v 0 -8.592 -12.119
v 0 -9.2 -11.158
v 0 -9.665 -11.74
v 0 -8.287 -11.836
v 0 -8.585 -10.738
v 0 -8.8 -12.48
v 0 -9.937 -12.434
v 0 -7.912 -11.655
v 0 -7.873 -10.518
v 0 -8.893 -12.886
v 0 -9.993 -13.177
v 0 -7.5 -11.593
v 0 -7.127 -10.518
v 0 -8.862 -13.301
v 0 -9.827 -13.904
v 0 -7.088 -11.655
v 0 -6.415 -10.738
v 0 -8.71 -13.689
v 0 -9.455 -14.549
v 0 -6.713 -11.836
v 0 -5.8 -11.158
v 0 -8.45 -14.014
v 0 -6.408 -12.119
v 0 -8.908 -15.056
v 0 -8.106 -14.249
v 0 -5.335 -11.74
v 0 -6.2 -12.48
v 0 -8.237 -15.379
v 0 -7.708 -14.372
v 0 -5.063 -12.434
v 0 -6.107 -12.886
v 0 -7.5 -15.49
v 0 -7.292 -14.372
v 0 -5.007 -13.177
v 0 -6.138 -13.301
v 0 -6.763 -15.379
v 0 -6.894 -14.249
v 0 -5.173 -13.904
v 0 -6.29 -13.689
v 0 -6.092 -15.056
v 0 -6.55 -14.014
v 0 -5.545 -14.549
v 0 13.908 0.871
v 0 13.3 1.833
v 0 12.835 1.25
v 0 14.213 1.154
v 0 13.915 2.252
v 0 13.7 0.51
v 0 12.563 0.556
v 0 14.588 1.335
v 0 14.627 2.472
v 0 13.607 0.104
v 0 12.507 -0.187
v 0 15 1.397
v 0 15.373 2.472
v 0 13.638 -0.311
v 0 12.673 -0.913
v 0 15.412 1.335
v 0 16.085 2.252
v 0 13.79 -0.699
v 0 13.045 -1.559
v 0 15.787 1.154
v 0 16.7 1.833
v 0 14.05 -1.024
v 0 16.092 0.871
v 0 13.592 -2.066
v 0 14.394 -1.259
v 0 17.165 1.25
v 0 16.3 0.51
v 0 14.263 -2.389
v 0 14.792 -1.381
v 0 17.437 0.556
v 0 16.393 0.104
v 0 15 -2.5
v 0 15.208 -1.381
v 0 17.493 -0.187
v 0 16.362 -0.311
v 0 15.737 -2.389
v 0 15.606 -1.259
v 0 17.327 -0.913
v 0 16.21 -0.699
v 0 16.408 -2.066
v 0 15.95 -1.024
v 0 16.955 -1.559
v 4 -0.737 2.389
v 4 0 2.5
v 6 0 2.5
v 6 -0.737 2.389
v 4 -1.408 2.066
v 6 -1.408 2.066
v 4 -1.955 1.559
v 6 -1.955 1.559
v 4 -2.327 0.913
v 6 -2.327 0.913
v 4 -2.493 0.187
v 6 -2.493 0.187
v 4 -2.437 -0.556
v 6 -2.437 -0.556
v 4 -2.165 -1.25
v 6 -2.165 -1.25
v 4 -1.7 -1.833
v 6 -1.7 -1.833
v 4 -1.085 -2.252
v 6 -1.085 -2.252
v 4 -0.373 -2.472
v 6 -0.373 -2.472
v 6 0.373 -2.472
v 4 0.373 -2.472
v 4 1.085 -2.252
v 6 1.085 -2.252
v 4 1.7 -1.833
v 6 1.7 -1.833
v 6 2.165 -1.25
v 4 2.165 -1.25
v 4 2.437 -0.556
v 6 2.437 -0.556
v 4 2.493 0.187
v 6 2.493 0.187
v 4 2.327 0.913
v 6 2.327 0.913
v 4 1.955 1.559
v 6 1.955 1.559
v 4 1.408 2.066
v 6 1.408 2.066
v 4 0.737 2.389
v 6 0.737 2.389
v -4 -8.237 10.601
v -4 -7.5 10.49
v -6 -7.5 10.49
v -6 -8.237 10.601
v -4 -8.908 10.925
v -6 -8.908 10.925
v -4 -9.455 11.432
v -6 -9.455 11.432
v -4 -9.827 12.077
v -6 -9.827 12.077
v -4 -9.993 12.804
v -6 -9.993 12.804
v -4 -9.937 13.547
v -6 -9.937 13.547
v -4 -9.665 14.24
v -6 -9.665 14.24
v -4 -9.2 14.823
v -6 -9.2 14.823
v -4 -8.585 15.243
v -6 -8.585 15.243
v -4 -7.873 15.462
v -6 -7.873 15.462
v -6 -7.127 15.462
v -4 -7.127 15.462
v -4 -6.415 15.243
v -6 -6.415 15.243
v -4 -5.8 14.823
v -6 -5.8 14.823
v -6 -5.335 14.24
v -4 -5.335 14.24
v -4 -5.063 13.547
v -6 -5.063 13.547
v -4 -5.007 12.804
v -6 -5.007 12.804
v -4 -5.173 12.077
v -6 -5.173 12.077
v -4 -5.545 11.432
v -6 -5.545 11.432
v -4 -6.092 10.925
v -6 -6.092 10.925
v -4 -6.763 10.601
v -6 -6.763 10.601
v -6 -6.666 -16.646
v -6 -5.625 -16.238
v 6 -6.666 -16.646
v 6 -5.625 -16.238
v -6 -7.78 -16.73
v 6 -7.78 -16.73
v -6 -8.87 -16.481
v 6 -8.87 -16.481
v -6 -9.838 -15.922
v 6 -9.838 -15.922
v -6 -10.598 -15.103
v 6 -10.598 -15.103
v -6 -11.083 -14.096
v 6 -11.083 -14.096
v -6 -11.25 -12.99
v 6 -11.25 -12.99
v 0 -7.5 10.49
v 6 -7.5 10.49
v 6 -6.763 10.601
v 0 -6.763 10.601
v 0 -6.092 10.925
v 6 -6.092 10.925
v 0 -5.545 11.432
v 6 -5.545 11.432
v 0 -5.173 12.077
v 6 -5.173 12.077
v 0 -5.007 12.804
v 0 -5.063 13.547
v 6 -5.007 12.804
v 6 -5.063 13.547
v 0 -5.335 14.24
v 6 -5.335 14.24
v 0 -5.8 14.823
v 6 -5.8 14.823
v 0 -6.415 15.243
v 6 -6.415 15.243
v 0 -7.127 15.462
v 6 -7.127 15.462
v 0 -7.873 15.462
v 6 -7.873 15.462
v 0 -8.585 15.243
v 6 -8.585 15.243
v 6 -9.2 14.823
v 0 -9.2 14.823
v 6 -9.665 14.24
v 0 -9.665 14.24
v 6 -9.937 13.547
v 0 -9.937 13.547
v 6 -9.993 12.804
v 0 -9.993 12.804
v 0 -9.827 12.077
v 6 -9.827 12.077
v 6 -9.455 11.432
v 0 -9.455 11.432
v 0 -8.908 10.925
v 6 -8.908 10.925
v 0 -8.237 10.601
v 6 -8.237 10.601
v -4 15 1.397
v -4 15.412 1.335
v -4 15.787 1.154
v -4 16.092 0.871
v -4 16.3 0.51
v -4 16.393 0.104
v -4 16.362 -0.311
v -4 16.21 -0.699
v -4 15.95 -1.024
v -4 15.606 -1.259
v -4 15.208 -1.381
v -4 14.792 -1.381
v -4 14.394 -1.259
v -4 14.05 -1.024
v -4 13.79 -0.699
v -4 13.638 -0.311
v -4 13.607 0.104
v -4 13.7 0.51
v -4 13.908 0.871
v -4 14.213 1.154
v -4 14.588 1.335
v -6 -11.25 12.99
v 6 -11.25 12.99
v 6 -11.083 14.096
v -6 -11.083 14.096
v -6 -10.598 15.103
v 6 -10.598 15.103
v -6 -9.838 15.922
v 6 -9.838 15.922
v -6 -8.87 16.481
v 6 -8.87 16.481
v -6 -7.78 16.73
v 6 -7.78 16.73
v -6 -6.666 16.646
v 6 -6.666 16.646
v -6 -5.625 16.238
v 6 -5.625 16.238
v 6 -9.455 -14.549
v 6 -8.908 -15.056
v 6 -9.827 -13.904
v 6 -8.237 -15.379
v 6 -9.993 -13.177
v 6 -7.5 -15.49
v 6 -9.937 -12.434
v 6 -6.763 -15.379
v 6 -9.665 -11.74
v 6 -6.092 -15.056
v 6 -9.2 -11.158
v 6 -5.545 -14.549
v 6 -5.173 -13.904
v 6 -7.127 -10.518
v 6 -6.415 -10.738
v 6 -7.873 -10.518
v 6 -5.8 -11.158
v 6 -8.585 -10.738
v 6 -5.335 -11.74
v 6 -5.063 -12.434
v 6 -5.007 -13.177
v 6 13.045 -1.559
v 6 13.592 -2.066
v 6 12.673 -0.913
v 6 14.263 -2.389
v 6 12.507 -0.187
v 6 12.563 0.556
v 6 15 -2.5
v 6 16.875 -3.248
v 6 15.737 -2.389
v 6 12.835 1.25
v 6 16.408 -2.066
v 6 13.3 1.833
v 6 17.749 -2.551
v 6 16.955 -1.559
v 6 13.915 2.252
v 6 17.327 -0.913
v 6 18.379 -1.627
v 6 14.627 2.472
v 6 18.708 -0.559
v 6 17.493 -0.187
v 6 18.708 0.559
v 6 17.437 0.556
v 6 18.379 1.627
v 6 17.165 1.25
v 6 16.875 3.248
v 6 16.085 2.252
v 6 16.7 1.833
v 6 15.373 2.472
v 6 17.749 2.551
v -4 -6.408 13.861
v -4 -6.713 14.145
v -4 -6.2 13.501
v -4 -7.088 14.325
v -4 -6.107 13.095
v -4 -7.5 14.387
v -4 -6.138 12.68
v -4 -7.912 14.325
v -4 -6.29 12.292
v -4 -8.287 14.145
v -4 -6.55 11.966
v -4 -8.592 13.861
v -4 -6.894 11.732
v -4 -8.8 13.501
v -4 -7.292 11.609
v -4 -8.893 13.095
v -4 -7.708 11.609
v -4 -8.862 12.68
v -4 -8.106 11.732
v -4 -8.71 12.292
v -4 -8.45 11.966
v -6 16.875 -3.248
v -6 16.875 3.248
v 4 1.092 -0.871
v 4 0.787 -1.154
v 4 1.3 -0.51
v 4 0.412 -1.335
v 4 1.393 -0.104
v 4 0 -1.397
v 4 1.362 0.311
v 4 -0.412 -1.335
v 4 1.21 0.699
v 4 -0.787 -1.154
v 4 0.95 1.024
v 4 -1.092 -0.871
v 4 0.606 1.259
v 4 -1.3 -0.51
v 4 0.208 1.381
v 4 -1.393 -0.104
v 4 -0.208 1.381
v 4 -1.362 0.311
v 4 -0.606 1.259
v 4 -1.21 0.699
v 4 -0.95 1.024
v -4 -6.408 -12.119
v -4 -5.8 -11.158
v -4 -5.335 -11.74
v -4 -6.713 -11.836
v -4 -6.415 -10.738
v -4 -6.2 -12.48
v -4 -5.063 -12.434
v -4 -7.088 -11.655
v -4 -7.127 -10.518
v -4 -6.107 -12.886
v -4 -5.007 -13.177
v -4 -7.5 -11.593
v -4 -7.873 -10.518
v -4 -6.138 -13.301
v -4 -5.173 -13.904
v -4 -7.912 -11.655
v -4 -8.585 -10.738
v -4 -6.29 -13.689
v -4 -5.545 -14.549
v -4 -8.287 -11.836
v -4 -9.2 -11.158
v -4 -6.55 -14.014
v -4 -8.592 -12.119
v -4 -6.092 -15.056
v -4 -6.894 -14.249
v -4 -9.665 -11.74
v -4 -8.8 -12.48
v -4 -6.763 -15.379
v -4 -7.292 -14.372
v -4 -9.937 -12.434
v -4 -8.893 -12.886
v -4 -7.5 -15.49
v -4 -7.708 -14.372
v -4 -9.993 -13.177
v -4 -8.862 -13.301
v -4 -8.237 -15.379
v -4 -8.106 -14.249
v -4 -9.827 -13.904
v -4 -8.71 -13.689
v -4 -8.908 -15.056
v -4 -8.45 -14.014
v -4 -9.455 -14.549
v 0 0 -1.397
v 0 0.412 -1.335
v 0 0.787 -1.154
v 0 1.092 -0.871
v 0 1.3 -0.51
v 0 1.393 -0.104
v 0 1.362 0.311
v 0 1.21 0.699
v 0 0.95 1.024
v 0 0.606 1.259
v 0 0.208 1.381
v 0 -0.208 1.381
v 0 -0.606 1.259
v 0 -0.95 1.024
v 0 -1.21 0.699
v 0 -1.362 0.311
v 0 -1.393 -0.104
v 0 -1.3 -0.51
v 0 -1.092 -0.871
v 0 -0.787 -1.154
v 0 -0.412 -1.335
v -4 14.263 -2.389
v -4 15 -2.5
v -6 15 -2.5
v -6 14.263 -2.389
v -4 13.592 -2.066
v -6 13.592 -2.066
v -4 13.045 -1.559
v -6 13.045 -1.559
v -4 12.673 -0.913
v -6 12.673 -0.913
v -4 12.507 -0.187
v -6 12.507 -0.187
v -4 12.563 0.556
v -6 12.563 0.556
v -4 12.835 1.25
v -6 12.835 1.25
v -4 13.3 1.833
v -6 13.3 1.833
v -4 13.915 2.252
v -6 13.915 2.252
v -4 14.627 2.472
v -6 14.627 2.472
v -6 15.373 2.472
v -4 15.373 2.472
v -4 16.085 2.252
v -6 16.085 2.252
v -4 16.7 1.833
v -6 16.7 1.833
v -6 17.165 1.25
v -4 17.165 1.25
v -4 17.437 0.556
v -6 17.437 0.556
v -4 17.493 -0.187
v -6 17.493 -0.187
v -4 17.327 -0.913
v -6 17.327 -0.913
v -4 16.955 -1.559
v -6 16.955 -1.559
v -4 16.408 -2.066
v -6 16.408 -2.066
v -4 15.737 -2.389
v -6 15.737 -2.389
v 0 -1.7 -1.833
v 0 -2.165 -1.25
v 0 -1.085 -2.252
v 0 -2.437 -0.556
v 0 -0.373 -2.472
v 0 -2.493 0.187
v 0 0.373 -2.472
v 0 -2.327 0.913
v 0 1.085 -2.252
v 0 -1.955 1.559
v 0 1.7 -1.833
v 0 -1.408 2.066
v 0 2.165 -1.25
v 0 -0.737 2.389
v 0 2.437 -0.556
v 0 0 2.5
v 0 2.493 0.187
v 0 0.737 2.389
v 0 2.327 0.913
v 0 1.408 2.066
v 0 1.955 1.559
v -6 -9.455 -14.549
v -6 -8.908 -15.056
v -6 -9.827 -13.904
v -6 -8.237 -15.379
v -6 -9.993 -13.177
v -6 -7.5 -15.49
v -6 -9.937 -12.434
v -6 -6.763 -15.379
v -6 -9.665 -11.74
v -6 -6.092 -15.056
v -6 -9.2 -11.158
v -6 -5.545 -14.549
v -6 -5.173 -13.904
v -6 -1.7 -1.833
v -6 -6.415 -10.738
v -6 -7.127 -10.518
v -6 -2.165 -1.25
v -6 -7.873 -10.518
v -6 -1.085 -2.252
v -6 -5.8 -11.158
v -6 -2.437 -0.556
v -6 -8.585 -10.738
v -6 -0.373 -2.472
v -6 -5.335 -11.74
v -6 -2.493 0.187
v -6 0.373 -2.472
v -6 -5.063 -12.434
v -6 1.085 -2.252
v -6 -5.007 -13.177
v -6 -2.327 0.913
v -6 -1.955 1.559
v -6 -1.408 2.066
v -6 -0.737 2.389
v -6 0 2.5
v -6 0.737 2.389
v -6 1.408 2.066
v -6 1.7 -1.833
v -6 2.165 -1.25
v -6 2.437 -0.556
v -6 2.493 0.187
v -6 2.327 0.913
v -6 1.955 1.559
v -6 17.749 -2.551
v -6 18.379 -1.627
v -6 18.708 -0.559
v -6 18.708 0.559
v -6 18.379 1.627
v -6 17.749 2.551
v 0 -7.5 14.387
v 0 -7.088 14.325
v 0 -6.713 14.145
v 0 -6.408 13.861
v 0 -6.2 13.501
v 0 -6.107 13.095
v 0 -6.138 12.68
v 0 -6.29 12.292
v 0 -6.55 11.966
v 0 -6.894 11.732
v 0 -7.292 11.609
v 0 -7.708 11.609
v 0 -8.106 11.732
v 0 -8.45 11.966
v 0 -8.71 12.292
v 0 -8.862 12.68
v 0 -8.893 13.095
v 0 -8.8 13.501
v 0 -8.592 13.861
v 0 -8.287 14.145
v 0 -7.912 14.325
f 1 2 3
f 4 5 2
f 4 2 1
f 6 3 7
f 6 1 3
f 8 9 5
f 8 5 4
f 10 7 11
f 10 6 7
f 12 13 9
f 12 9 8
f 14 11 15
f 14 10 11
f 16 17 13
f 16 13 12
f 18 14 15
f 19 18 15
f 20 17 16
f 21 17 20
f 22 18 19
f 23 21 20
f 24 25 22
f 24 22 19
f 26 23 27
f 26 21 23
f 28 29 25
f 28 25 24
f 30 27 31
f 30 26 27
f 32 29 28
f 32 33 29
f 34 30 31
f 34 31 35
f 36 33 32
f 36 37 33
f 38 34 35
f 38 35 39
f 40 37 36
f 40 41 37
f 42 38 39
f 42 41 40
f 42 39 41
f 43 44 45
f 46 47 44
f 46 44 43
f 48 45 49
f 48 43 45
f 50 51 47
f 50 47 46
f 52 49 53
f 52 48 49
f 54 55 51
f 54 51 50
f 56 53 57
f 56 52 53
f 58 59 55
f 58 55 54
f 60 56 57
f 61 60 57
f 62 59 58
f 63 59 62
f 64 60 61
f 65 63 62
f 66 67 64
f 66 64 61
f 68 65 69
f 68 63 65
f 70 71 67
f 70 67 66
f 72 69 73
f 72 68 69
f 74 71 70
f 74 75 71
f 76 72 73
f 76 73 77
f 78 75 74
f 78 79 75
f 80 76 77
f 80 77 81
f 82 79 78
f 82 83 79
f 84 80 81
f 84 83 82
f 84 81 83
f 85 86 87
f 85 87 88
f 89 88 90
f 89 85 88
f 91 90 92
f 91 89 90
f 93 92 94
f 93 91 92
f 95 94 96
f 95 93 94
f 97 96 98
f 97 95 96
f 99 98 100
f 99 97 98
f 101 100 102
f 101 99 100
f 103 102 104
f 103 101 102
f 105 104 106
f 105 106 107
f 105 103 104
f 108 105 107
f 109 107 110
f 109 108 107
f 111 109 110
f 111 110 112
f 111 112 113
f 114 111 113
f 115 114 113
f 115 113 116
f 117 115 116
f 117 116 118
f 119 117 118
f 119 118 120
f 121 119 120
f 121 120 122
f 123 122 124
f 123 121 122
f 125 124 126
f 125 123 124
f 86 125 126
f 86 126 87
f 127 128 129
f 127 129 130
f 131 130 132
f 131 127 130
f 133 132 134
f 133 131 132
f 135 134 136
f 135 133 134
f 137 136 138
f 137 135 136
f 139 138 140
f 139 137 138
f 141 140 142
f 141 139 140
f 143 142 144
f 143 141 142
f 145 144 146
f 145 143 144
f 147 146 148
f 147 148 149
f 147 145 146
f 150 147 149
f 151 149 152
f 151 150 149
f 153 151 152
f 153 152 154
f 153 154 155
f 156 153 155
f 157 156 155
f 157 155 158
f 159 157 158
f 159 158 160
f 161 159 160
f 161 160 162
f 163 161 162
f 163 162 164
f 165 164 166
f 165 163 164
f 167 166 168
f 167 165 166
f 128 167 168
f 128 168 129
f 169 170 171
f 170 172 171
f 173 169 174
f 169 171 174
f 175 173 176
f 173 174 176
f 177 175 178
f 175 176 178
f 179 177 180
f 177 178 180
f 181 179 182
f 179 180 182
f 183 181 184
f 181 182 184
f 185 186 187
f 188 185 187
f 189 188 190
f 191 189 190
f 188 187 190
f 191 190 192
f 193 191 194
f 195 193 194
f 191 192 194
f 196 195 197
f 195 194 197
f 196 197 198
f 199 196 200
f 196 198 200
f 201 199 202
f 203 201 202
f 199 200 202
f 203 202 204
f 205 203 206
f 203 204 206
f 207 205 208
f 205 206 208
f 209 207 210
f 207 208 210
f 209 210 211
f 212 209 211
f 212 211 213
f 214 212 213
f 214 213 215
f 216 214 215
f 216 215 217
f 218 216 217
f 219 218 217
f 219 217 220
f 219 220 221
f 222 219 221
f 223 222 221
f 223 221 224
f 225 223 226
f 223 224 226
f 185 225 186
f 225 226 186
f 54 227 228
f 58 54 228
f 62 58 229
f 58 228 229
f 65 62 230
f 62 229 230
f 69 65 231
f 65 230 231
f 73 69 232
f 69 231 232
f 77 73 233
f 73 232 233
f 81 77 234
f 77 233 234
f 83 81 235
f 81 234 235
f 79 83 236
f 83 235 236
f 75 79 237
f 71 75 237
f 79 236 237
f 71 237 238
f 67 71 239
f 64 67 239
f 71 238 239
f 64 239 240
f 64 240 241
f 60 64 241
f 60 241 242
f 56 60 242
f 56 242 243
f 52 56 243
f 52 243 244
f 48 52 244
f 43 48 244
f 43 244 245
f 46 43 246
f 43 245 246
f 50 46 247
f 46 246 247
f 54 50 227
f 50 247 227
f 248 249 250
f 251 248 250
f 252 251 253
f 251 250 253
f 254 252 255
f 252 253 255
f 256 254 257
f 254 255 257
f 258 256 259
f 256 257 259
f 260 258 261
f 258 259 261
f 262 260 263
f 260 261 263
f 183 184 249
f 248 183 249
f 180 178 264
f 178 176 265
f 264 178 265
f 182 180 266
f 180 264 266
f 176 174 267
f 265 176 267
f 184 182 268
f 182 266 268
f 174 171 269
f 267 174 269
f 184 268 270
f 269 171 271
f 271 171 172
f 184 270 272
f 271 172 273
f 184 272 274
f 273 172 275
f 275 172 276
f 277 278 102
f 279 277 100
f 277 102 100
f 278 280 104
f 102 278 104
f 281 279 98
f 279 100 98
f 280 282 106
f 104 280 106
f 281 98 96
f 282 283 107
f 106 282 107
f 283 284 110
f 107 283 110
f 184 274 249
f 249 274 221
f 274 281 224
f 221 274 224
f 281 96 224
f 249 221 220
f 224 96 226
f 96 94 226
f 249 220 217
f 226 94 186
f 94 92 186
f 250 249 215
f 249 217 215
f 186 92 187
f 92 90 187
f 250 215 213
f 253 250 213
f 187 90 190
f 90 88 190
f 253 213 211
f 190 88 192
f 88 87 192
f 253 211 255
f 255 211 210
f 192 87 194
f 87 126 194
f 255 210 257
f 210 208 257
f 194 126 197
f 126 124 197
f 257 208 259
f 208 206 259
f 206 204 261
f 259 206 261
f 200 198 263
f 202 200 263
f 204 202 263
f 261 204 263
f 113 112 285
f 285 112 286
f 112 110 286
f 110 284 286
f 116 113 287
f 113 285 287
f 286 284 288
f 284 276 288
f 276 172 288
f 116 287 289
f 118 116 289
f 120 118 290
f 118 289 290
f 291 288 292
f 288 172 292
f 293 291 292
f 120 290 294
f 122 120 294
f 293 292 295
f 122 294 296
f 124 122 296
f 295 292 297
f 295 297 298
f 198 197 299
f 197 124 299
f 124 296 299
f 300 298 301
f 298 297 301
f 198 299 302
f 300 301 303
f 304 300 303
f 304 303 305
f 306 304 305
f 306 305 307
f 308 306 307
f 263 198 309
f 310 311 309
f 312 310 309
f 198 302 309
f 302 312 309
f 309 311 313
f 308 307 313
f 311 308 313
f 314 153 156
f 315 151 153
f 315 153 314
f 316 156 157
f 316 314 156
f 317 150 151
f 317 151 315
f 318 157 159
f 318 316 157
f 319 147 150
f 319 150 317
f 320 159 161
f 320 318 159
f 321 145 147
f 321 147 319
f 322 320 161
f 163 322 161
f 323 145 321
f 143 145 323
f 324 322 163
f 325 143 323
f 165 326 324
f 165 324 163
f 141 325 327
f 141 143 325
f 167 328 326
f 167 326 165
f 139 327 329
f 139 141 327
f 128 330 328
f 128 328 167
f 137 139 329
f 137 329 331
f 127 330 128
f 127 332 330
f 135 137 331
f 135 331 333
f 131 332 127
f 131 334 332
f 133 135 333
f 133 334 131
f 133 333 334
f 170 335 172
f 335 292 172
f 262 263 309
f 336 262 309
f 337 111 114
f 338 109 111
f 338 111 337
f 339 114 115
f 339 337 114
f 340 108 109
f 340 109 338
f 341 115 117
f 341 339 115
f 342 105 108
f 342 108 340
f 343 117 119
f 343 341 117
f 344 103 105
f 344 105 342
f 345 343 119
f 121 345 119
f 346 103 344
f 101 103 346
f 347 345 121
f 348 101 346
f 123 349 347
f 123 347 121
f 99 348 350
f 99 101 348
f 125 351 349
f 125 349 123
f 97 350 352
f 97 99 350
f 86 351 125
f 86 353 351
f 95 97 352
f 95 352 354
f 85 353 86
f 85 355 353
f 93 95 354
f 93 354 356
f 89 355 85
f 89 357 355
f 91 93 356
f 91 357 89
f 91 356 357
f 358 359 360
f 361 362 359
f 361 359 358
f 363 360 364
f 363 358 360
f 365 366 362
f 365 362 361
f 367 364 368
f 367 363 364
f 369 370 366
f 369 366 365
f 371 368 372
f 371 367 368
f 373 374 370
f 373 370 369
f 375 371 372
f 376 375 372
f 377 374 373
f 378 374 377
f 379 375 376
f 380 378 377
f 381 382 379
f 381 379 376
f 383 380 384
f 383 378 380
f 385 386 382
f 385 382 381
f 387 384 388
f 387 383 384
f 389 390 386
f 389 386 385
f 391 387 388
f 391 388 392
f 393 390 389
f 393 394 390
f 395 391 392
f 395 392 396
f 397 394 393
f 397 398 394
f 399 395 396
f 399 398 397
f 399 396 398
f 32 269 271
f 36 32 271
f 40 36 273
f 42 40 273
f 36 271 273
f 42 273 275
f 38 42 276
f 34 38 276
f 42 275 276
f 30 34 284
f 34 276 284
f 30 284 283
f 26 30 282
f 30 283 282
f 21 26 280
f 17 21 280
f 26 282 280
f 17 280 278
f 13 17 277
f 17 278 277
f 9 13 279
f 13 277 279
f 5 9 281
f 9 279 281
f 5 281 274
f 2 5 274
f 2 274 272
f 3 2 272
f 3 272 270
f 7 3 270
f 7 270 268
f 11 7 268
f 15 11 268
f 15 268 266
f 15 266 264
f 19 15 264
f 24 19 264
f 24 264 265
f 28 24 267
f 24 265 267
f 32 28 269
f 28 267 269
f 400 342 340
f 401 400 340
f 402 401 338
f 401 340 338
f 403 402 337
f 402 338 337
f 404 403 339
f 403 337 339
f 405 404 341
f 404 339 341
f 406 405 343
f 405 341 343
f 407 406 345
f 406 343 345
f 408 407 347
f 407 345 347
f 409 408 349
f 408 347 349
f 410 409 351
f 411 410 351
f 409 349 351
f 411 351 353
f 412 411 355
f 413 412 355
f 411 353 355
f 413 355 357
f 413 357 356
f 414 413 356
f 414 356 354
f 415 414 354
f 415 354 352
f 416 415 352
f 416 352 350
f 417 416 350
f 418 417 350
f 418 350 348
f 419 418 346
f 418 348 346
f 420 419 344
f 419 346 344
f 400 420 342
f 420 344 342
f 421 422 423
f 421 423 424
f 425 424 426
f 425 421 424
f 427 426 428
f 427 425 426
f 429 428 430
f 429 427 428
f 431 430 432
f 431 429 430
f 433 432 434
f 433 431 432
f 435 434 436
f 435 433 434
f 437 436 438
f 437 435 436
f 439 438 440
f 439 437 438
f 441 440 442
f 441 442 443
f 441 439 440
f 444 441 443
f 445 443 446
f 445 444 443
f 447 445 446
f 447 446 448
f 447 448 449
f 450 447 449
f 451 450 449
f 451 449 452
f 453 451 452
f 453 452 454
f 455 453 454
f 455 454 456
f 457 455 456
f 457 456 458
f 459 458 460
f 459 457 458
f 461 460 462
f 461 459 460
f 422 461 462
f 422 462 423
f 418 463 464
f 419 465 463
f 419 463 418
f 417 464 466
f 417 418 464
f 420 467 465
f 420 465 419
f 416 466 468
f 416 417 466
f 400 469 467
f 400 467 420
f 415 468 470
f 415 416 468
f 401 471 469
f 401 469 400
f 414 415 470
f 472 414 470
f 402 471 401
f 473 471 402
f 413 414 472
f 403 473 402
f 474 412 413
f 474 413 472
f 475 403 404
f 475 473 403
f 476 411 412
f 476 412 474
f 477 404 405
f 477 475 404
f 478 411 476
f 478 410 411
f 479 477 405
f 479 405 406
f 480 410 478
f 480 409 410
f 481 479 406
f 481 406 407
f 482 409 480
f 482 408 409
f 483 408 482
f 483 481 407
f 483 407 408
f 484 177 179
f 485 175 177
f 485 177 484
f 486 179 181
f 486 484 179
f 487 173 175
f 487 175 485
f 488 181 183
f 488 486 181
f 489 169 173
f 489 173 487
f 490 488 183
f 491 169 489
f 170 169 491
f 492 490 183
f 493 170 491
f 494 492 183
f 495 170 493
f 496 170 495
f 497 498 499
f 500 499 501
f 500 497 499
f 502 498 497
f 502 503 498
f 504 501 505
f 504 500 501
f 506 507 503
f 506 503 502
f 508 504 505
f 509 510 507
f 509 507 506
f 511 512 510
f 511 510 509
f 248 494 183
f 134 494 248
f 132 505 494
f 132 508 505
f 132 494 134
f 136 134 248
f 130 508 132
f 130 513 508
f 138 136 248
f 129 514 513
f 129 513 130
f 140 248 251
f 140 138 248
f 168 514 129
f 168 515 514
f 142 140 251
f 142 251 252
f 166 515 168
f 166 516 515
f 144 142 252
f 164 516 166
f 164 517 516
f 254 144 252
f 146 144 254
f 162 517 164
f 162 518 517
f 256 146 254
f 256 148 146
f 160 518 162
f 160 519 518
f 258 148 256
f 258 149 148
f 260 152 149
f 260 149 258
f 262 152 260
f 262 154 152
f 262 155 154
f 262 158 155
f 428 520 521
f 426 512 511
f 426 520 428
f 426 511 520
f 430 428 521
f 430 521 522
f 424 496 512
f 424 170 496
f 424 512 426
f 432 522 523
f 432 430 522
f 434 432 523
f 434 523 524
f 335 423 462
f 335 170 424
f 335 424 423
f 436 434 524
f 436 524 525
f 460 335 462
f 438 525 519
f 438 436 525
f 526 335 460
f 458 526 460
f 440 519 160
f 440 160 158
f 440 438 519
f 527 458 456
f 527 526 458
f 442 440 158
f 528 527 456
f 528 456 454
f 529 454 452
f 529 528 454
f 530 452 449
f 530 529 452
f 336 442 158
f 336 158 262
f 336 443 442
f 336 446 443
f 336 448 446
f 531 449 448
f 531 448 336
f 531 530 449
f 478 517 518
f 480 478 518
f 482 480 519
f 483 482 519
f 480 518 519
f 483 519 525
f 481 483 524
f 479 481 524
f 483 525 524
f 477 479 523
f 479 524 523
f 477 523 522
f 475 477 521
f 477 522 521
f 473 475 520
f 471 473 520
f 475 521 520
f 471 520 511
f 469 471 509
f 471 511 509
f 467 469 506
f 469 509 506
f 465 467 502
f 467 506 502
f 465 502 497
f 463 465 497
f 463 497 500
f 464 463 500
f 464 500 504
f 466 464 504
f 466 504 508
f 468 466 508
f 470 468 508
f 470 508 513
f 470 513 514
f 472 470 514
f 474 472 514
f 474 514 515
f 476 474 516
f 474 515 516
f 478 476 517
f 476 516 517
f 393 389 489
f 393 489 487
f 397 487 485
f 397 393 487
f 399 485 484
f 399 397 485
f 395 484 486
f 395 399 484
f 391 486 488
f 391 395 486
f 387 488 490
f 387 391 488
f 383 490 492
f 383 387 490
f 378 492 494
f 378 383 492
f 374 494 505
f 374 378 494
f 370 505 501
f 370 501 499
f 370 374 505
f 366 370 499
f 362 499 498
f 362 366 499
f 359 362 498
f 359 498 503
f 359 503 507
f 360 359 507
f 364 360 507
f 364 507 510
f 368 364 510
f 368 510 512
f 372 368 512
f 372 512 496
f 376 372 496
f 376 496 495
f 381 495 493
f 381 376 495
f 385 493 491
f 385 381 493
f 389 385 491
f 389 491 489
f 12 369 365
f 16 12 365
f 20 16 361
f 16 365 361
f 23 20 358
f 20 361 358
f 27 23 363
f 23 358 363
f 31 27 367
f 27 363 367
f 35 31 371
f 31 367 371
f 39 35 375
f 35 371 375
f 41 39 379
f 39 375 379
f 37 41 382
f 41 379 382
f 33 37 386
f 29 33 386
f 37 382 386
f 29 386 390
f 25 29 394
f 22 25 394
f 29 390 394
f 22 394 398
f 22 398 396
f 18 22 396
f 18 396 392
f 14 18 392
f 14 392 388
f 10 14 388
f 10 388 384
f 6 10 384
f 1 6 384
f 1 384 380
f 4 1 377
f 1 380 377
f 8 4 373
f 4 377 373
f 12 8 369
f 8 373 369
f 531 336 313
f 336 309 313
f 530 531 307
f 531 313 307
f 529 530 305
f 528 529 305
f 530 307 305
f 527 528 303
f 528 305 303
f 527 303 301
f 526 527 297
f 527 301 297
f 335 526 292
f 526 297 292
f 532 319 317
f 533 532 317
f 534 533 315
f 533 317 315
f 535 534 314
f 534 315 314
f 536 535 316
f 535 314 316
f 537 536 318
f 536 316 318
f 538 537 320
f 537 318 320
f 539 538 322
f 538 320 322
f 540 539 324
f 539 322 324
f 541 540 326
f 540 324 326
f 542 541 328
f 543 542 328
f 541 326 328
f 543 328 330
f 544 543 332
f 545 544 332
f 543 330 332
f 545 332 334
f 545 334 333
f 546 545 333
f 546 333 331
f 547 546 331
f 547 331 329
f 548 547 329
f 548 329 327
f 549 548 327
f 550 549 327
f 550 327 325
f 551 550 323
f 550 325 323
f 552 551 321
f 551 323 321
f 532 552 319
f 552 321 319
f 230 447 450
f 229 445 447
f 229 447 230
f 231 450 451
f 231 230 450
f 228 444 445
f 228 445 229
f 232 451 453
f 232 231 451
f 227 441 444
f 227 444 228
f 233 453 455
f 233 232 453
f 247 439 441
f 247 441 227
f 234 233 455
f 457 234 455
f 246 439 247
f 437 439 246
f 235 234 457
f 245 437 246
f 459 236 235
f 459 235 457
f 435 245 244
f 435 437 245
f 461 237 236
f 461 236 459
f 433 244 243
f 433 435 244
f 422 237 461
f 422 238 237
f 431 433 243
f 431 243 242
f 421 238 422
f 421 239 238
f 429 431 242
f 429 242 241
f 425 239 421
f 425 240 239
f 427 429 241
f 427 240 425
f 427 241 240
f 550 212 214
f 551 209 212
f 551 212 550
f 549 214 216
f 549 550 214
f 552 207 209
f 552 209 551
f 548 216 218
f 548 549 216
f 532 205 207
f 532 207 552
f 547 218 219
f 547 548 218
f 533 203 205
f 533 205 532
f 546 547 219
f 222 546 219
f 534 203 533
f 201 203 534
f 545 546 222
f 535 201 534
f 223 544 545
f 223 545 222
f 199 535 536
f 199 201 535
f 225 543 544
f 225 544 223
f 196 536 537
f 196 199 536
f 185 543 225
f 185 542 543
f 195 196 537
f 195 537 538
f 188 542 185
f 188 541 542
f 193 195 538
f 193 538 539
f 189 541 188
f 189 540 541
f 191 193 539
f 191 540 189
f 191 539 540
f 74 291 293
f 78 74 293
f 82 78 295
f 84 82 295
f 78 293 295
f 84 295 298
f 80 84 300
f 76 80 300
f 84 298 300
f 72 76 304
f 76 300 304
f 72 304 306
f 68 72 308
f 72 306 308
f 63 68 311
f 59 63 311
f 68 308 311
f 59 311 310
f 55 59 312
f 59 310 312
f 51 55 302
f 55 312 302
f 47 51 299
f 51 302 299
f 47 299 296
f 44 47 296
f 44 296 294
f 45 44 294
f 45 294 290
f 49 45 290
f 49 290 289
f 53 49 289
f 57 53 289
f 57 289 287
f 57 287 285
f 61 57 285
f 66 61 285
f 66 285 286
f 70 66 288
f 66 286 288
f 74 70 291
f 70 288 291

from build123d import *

# Parameters (mm, degrees)
BOSS_EXTRUDE1_DEPTH       = 6
SKETCH4_R                 = 2.5
CUT_EXTRUDE1_DEPTH        = 6
SKETCH5_R                 = 2.5
CUT_EXTRUDE2_DEPTH        = 6
F_3_CLEARANCE_HOLE1_D     = 2.794
F_3_CLEARANCE_HOLE1_DEPTH = 6
F_3_CLEARANCE_HOLE1_TIP   = 0.839402285
F_3_CLEARANCE_HOLE2_D     = 2.794
F_3_CLEARANCE_HOLE2_DEPTH = 6
F_3_CLEARANCE_HOLE2_TIP   = 0.839402285
CUT_EXTRUDE3_START        = -2
SKETCH11_R                = 2.5
CUT_EXTRUDE3_DEPTH        = 2
CUT_EXTRUDE4_START        = -2
SKETCH12_R                = 2.5
CUT_EXTRUDE4_DEPTH        = 2


with BuildPart() as part:
    # Sketch3 → Boss-Extrude1 (new, symmetric)
    with BuildSketch(Plane(origin=(0, 0, 0), x_dir=(0, 0, -1), z_dir=(1, 0, 0))):
        with BuildLine():
            Line((-16.237976321, -5.625), (-3.247595264, 16.875))
            ThreePointArc((-3.247595264, 16.875), (0, 18.75), (3.247595264, 16.875))
            Line((3.247595264, 16.875), (16.237976321, -5.625))
            ThreePointArc((16.237976321, -5.625), (16.237976321, -9.375), (12.990381057, -11.25))
            Line((12.990381057, -11.25), (-12.990381057, -11.25))
            ThreePointArc((-12.990381057, -11.25), (-16.237976321, -9.375), (-16.237976321, -5.625))
        make_face()
    extrude(amount=BOSS_EXTRUDE1_DEPTH, both=True)

    # Sketch4 → Cut-Extrude1 (cut)
    with BuildSketch(Plane(origin=(6, 0, 0), x_dir=(0, 0, -1), z_dir=(1, 0, 0))):
        with Locations((0, 15)):
            Circle(SKETCH4_R)
        with Locations((-12.990381057, -7.5)):
            Circle(SKETCH4_R)
        with Locations((12.990381057, -7.5)):
            Circle(SKETCH4_R)
    extrude(amount=-CUT_EXTRUDE1_DEPTH, mode=Mode.SUBTRACT)

    # Sketch5 → Cut-Extrude2 (cut)
    with BuildSketch(Plane.ZY.offset(6)):
        Circle(SKETCH5_R)
    extrude(amount=-CUT_EXTRUDE2_DEPTH, mode=Mode.SUBTRACT)

    # #3 Clearance Hole1
    with Locations(Plane(origin=(0, 0, 0), x_dir=(0, 0, -1), z_dir=(1, 0, 0))):
        with Locations((12.990381057, -7.5), (0, 15), (-12.990381057, -7.5)):
            Hole(F_3_CLEARANCE_HOLE1_D / 2, depth=F_3_CLEARANCE_HOLE1_DEPTH)
            with Locations((0, 0, -(F_3_CLEARANCE_HOLE1_DEPTH + F_3_CLEARANCE_HOLE1_TIP / 2))):  # 118° drill point
                Cone(0, F_3_CLEARANCE_HOLE1_D / 2, F_3_CLEARANCE_HOLE1_TIP, mode=Mode.SUBTRACT)

    # #3 Clearance Hole2
    with Locations(Plane.ZY):
        with Locations((0, 0)):
            Hole(F_3_CLEARANCE_HOLE2_D / 2, depth=F_3_CLEARANCE_HOLE2_DEPTH)
            with Locations((0, 0, -(F_3_CLEARANCE_HOLE2_DEPTH + F_3_CLEARANCE_HOLE2_TIP / 2))):  # 118° drill point
                Cone(0, F_3_CLEARANCE_HOLE2_D / 2, F_3_CLEARANCE_HOLE2_TIP, mode=Mode.SUBTRACT)

    # Sketch11 → Cut-Extrude3 (cut)
    with BuildSketch(Plane.ZY.offset(6).offset(CUT_EXTRUDE3_START)):
        with Locations(Location((0, 15, 0), (0, 0, 180))):
            Circle(SKETCH11_R)
        with Locations(Location((-12.990381057, -7.5, 0), (0, 0, 180))):
            Circle(SKETCH11_R)
        with Locations(Location((12.990381057, -7.5, 0), (0, 0, 180))):
            Circle(SKETCH11_R)
    extrude(amount=CUT_EXTRUDE3_DEPTH, mode=Mode.SUBTRACT)

    # Sketch12 → Cut-Extrude4 (cut)
    with BuildSketch(Plane(origin=(6, 0, 0), x_dir=(0, 0, -1), z_dir=(1, 0, 0)).offset(CUT_EXTRUDE4_START)):
        with Locations(Location((0, 0, 0), (0, 0, 180))):
            Circle(SKETCH12_R)
    extrude(amount=CUT_EXTRUDE4_DEPTH, mode=Mode.SUBTRACT)


solid = part.part
